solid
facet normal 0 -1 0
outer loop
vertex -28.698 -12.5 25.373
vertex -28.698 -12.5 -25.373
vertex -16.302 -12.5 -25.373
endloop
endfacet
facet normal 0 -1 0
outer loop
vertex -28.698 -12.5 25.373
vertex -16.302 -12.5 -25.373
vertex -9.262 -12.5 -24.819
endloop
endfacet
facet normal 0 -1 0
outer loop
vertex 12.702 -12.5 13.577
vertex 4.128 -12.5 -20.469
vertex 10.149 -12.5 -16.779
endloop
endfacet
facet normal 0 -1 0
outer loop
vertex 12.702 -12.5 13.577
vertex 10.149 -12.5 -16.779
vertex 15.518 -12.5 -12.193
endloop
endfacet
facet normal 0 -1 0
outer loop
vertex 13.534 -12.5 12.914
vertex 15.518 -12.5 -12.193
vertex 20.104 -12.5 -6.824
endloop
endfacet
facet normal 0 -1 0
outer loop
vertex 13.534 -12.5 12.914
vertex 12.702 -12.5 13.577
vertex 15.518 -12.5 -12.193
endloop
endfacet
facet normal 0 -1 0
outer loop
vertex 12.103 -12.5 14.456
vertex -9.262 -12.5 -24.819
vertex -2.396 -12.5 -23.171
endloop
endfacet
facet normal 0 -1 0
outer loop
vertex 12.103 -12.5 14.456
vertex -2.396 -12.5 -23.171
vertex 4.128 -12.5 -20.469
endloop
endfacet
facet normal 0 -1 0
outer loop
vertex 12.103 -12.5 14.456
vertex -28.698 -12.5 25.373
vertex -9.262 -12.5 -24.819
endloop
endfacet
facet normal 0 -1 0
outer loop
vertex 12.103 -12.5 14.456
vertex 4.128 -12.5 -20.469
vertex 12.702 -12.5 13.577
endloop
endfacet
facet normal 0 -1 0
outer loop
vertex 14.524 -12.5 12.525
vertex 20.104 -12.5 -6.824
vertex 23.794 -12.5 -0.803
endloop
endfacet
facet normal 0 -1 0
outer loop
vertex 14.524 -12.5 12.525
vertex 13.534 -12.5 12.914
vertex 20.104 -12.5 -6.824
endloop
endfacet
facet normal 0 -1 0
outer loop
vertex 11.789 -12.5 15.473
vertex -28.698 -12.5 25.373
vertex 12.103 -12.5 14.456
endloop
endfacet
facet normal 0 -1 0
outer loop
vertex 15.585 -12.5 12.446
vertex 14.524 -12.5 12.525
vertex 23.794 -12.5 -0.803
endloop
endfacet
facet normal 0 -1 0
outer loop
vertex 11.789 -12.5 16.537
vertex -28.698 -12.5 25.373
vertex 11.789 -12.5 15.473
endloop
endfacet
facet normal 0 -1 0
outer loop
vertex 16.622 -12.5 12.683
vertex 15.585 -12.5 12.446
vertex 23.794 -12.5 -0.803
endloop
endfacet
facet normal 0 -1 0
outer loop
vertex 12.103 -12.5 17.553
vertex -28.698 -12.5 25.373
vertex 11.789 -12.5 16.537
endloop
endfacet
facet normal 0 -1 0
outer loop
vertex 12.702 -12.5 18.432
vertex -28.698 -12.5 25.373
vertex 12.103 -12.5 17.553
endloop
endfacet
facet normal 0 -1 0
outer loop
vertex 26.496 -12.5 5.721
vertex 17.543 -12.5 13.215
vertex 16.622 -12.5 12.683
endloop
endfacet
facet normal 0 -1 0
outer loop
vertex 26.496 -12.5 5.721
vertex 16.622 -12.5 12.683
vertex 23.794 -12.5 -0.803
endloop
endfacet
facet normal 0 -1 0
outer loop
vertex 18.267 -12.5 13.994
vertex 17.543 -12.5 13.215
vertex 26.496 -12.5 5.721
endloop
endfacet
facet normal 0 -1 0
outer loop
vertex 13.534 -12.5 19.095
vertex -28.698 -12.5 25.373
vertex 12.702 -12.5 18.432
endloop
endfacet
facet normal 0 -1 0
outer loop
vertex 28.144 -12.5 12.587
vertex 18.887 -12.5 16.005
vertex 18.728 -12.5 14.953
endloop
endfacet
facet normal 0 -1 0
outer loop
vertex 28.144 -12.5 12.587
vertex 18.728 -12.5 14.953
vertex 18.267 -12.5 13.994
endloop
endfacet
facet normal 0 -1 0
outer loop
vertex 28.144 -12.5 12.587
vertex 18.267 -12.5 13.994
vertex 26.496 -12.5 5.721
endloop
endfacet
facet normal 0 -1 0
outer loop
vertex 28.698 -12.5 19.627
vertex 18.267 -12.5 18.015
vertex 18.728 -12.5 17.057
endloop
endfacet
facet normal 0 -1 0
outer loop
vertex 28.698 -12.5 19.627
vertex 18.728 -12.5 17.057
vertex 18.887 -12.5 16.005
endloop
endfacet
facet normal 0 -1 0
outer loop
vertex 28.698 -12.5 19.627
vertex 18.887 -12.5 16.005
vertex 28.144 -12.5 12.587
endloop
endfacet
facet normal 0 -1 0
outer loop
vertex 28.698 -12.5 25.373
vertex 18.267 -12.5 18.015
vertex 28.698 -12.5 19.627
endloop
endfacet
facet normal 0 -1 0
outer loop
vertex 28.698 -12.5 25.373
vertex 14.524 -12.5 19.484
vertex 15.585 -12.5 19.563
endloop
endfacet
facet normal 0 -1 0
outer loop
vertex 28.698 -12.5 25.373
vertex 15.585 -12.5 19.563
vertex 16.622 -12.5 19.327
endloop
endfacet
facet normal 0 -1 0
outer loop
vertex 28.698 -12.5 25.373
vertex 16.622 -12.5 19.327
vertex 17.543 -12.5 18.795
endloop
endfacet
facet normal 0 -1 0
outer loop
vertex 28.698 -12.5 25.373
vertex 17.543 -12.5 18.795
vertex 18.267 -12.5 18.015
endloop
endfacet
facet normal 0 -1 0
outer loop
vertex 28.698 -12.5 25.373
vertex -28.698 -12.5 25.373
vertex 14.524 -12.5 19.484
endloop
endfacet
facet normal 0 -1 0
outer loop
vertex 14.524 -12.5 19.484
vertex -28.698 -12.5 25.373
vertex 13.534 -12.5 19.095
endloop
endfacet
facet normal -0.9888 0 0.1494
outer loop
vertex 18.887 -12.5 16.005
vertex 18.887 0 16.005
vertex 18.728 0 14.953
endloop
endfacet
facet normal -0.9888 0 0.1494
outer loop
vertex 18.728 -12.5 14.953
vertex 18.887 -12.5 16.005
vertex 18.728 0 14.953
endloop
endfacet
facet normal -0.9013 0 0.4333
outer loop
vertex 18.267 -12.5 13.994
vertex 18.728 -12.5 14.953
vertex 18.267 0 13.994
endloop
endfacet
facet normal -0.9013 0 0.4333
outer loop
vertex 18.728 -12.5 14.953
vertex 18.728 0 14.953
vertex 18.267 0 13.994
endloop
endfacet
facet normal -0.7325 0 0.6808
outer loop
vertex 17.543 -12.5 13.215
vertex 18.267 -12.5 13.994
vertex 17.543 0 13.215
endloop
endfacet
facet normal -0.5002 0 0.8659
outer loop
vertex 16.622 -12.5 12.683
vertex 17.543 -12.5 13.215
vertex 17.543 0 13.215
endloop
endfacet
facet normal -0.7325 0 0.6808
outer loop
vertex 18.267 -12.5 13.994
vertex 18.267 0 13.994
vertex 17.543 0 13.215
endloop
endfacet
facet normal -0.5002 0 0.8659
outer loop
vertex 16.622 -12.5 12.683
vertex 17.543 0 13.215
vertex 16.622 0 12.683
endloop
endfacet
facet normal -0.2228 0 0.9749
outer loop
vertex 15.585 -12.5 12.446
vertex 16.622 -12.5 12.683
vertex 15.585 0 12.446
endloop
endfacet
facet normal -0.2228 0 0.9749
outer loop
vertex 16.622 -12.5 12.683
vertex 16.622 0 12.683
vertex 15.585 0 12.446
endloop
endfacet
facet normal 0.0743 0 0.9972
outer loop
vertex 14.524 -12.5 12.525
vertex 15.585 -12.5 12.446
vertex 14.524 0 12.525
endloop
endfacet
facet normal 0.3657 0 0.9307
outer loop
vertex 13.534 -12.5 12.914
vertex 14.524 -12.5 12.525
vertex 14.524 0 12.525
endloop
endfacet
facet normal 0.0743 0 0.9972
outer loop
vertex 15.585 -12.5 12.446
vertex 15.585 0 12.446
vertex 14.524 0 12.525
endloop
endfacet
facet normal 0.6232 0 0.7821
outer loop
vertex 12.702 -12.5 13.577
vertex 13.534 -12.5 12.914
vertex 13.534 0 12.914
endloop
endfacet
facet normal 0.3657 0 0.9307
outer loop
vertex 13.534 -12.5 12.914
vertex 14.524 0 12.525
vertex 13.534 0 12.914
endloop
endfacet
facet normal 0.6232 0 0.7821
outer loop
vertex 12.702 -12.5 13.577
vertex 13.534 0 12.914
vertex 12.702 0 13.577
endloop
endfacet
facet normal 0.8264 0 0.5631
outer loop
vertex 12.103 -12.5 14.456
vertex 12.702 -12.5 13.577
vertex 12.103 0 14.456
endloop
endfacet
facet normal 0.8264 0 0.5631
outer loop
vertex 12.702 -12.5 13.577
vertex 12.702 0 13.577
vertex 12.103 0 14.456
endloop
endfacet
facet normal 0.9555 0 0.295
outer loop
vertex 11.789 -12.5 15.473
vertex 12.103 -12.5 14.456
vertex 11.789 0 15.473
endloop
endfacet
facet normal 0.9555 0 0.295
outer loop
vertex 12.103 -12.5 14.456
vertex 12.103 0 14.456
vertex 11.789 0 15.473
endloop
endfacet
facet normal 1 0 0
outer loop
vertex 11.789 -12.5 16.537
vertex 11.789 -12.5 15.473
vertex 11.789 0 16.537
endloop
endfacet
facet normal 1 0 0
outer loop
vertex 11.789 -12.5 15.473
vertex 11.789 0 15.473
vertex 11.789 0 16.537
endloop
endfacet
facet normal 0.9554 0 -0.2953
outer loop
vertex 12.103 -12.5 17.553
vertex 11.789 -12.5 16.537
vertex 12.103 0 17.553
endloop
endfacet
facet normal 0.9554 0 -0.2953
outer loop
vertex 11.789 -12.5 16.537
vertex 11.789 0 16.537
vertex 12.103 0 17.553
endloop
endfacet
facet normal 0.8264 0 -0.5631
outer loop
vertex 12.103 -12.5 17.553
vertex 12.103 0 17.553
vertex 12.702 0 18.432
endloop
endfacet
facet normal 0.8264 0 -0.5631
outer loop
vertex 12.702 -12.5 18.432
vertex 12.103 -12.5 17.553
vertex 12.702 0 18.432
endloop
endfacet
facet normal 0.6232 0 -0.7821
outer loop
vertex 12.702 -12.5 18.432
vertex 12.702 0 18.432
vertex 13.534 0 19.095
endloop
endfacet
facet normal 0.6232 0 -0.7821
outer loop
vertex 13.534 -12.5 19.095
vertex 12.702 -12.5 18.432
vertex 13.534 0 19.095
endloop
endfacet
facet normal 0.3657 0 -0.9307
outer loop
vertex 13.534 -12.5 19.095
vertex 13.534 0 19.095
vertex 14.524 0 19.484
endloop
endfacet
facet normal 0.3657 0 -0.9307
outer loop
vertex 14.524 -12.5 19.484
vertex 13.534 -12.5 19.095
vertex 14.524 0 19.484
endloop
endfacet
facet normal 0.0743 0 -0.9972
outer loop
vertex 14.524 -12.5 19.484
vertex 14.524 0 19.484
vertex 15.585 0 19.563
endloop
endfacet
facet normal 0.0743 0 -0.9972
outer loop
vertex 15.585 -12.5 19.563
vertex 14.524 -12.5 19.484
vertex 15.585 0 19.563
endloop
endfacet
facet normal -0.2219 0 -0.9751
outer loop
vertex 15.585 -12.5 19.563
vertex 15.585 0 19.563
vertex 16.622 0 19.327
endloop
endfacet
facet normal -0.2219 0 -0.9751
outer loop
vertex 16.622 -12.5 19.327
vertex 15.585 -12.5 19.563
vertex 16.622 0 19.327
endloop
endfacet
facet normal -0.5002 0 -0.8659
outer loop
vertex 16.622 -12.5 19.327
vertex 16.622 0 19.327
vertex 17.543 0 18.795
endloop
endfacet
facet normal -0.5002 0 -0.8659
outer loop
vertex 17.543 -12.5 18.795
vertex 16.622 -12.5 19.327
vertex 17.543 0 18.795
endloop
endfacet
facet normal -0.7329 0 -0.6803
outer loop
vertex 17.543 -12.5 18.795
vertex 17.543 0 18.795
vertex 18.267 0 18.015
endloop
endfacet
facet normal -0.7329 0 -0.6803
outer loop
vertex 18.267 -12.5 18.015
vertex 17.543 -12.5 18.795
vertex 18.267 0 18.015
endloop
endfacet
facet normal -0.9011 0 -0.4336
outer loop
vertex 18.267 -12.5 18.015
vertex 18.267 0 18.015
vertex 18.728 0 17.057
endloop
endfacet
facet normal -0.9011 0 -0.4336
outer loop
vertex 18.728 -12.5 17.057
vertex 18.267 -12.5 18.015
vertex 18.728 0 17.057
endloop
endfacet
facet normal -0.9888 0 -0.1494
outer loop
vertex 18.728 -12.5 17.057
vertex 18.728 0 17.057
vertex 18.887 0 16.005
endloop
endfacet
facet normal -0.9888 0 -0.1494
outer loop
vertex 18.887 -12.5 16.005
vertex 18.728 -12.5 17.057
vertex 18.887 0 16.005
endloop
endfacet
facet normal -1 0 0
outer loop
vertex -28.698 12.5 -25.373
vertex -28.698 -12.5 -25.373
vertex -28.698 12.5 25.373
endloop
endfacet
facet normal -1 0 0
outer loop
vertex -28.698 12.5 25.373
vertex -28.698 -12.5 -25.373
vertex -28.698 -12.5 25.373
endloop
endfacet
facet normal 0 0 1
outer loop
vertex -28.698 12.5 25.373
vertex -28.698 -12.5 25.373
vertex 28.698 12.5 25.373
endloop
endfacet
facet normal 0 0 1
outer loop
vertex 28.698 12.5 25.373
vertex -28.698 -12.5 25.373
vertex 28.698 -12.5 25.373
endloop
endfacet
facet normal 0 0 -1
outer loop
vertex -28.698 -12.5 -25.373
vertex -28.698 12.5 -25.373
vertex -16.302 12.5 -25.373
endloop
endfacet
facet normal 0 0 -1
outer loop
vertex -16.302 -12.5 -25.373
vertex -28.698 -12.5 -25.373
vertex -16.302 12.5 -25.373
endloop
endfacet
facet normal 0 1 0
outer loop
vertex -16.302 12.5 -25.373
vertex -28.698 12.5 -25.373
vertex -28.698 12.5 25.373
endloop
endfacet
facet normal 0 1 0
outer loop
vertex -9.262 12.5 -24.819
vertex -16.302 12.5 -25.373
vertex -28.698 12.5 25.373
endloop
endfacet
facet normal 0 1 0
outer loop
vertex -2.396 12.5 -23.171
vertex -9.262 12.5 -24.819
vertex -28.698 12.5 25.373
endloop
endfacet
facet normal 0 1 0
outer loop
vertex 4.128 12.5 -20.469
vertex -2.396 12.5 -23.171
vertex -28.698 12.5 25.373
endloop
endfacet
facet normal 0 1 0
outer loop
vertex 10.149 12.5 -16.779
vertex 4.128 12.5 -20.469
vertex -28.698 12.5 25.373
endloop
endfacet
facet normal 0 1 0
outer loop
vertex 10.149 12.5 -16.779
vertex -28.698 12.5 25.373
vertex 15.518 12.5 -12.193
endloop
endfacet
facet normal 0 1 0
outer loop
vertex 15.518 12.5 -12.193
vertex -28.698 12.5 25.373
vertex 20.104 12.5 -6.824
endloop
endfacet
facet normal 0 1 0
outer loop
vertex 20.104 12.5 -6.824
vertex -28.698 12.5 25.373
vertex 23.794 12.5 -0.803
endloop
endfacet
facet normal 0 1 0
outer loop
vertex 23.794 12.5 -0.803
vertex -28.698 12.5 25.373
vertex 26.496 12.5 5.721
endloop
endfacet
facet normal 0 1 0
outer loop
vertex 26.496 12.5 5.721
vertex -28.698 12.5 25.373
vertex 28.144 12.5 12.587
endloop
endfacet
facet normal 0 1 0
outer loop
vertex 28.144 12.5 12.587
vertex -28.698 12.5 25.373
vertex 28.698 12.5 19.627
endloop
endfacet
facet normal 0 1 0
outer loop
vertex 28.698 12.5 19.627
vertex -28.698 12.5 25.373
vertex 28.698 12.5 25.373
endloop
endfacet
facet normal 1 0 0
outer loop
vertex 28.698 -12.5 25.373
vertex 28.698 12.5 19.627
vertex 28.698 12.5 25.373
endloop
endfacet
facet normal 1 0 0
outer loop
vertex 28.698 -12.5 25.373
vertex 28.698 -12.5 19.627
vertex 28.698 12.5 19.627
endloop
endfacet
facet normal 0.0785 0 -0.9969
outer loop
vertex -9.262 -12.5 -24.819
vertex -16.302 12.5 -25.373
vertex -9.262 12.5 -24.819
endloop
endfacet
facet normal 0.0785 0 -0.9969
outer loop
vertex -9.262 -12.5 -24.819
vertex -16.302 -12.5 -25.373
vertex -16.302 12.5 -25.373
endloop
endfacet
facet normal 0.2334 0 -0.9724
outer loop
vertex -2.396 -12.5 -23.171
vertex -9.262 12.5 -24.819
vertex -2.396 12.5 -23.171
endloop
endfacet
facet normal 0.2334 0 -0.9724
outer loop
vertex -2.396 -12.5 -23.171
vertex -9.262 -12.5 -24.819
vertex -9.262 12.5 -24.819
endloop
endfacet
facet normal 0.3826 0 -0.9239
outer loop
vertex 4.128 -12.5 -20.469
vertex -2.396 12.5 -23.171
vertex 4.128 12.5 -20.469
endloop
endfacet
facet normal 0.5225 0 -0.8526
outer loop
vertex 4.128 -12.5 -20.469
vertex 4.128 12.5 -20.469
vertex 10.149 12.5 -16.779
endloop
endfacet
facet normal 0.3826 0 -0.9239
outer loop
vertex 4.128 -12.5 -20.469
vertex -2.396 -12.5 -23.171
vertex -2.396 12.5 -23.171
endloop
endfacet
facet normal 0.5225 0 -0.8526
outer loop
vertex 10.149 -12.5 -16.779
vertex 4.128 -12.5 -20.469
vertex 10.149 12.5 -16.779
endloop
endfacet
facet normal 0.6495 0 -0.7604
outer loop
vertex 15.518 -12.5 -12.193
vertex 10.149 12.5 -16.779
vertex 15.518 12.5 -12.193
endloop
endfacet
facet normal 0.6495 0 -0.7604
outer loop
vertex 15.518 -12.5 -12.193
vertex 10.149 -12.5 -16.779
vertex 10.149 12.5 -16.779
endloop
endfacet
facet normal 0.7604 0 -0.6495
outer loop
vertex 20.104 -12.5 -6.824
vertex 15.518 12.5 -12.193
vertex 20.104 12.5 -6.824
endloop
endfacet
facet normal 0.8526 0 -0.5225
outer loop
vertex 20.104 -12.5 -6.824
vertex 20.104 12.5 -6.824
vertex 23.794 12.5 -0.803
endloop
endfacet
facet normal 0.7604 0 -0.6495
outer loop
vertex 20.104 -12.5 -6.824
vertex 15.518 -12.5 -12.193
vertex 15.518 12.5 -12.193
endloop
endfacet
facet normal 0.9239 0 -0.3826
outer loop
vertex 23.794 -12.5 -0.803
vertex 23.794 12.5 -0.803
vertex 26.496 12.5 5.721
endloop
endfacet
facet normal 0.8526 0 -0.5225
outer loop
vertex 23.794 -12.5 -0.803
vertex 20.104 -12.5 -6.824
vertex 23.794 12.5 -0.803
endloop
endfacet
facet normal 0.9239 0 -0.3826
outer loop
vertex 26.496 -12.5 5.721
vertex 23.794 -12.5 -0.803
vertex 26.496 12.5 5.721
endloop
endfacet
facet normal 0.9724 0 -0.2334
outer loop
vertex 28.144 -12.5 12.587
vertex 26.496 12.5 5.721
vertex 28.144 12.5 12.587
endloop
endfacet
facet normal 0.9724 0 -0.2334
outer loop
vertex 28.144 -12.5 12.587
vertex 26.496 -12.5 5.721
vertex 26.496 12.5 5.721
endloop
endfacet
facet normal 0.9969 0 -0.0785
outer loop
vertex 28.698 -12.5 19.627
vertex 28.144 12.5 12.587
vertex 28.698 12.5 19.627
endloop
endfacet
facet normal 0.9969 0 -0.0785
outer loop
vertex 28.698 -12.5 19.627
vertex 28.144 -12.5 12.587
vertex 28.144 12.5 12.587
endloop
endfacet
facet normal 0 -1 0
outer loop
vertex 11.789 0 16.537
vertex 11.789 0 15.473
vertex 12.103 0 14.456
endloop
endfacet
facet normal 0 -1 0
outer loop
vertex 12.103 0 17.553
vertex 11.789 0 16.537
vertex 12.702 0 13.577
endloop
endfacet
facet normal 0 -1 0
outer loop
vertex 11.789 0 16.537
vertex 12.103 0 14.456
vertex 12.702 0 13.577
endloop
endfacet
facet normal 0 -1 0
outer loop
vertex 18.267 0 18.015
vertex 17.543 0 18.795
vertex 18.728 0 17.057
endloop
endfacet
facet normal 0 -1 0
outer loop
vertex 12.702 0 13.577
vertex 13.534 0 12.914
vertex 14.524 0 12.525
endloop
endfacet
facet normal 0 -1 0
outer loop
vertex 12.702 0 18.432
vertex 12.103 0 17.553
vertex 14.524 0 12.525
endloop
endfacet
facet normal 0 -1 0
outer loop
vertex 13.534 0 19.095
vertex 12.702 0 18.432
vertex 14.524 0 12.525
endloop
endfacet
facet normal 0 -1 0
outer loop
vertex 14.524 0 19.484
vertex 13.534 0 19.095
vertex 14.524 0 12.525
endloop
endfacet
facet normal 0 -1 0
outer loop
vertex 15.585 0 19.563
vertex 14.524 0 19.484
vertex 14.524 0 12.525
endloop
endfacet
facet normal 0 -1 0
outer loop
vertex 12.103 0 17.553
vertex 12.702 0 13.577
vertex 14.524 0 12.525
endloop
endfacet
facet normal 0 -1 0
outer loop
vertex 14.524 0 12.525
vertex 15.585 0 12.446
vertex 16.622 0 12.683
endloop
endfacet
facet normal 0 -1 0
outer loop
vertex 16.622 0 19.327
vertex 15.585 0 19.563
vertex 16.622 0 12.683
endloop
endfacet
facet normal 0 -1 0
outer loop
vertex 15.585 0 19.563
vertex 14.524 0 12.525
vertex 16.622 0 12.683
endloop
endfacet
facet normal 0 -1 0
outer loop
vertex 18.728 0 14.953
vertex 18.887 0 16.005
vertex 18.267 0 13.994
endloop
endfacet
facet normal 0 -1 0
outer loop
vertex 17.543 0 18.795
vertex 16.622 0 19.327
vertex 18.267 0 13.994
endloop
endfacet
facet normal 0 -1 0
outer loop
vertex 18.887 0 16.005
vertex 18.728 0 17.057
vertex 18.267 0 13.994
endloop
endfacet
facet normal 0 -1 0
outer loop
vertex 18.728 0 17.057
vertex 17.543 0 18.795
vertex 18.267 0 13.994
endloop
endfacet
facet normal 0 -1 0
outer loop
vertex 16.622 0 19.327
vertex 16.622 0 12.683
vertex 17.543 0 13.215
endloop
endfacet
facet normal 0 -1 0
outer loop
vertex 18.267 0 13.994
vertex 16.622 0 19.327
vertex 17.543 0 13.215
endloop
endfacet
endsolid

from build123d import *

# Parameters (mm, degrees)
F0_W     = 57.3965907097
F0_H     = 50.7467389107
F1_DEPTH = 12.5
F3_D     = 7.1374
F3_DEPTH = 12.501
F4_R     = 45


with BuildPart() as f1:
    # F0 (on Front) → F1 (new body, symmetric)
    with BuildSketch(Plane.XZ):
        Rectangle(F0_W, F0_H)
    extrude(amount=F1_DEPTH, both=True)

    # F3 (through all, one way)
    with BuildSketch(Plane(origin=(0, 0, 0), x_dir=(1, 0, 0), z_dir=(0, 1, 0))):
        with Locations((15.3181608766, -16.0046312958)):
            Circle(F3_D / 2)
    extrude(amount=-F3_DEPTH, mode=Mode.SUBTRACT)

    # F4
    f4_edges = [f1.edges().sort_by_distance(p)[0] for p in [
        (28.698295, 0, -25.373369),
    ]]
    fillet(f4_edges, radius=F4_R)


solid = f1.part
